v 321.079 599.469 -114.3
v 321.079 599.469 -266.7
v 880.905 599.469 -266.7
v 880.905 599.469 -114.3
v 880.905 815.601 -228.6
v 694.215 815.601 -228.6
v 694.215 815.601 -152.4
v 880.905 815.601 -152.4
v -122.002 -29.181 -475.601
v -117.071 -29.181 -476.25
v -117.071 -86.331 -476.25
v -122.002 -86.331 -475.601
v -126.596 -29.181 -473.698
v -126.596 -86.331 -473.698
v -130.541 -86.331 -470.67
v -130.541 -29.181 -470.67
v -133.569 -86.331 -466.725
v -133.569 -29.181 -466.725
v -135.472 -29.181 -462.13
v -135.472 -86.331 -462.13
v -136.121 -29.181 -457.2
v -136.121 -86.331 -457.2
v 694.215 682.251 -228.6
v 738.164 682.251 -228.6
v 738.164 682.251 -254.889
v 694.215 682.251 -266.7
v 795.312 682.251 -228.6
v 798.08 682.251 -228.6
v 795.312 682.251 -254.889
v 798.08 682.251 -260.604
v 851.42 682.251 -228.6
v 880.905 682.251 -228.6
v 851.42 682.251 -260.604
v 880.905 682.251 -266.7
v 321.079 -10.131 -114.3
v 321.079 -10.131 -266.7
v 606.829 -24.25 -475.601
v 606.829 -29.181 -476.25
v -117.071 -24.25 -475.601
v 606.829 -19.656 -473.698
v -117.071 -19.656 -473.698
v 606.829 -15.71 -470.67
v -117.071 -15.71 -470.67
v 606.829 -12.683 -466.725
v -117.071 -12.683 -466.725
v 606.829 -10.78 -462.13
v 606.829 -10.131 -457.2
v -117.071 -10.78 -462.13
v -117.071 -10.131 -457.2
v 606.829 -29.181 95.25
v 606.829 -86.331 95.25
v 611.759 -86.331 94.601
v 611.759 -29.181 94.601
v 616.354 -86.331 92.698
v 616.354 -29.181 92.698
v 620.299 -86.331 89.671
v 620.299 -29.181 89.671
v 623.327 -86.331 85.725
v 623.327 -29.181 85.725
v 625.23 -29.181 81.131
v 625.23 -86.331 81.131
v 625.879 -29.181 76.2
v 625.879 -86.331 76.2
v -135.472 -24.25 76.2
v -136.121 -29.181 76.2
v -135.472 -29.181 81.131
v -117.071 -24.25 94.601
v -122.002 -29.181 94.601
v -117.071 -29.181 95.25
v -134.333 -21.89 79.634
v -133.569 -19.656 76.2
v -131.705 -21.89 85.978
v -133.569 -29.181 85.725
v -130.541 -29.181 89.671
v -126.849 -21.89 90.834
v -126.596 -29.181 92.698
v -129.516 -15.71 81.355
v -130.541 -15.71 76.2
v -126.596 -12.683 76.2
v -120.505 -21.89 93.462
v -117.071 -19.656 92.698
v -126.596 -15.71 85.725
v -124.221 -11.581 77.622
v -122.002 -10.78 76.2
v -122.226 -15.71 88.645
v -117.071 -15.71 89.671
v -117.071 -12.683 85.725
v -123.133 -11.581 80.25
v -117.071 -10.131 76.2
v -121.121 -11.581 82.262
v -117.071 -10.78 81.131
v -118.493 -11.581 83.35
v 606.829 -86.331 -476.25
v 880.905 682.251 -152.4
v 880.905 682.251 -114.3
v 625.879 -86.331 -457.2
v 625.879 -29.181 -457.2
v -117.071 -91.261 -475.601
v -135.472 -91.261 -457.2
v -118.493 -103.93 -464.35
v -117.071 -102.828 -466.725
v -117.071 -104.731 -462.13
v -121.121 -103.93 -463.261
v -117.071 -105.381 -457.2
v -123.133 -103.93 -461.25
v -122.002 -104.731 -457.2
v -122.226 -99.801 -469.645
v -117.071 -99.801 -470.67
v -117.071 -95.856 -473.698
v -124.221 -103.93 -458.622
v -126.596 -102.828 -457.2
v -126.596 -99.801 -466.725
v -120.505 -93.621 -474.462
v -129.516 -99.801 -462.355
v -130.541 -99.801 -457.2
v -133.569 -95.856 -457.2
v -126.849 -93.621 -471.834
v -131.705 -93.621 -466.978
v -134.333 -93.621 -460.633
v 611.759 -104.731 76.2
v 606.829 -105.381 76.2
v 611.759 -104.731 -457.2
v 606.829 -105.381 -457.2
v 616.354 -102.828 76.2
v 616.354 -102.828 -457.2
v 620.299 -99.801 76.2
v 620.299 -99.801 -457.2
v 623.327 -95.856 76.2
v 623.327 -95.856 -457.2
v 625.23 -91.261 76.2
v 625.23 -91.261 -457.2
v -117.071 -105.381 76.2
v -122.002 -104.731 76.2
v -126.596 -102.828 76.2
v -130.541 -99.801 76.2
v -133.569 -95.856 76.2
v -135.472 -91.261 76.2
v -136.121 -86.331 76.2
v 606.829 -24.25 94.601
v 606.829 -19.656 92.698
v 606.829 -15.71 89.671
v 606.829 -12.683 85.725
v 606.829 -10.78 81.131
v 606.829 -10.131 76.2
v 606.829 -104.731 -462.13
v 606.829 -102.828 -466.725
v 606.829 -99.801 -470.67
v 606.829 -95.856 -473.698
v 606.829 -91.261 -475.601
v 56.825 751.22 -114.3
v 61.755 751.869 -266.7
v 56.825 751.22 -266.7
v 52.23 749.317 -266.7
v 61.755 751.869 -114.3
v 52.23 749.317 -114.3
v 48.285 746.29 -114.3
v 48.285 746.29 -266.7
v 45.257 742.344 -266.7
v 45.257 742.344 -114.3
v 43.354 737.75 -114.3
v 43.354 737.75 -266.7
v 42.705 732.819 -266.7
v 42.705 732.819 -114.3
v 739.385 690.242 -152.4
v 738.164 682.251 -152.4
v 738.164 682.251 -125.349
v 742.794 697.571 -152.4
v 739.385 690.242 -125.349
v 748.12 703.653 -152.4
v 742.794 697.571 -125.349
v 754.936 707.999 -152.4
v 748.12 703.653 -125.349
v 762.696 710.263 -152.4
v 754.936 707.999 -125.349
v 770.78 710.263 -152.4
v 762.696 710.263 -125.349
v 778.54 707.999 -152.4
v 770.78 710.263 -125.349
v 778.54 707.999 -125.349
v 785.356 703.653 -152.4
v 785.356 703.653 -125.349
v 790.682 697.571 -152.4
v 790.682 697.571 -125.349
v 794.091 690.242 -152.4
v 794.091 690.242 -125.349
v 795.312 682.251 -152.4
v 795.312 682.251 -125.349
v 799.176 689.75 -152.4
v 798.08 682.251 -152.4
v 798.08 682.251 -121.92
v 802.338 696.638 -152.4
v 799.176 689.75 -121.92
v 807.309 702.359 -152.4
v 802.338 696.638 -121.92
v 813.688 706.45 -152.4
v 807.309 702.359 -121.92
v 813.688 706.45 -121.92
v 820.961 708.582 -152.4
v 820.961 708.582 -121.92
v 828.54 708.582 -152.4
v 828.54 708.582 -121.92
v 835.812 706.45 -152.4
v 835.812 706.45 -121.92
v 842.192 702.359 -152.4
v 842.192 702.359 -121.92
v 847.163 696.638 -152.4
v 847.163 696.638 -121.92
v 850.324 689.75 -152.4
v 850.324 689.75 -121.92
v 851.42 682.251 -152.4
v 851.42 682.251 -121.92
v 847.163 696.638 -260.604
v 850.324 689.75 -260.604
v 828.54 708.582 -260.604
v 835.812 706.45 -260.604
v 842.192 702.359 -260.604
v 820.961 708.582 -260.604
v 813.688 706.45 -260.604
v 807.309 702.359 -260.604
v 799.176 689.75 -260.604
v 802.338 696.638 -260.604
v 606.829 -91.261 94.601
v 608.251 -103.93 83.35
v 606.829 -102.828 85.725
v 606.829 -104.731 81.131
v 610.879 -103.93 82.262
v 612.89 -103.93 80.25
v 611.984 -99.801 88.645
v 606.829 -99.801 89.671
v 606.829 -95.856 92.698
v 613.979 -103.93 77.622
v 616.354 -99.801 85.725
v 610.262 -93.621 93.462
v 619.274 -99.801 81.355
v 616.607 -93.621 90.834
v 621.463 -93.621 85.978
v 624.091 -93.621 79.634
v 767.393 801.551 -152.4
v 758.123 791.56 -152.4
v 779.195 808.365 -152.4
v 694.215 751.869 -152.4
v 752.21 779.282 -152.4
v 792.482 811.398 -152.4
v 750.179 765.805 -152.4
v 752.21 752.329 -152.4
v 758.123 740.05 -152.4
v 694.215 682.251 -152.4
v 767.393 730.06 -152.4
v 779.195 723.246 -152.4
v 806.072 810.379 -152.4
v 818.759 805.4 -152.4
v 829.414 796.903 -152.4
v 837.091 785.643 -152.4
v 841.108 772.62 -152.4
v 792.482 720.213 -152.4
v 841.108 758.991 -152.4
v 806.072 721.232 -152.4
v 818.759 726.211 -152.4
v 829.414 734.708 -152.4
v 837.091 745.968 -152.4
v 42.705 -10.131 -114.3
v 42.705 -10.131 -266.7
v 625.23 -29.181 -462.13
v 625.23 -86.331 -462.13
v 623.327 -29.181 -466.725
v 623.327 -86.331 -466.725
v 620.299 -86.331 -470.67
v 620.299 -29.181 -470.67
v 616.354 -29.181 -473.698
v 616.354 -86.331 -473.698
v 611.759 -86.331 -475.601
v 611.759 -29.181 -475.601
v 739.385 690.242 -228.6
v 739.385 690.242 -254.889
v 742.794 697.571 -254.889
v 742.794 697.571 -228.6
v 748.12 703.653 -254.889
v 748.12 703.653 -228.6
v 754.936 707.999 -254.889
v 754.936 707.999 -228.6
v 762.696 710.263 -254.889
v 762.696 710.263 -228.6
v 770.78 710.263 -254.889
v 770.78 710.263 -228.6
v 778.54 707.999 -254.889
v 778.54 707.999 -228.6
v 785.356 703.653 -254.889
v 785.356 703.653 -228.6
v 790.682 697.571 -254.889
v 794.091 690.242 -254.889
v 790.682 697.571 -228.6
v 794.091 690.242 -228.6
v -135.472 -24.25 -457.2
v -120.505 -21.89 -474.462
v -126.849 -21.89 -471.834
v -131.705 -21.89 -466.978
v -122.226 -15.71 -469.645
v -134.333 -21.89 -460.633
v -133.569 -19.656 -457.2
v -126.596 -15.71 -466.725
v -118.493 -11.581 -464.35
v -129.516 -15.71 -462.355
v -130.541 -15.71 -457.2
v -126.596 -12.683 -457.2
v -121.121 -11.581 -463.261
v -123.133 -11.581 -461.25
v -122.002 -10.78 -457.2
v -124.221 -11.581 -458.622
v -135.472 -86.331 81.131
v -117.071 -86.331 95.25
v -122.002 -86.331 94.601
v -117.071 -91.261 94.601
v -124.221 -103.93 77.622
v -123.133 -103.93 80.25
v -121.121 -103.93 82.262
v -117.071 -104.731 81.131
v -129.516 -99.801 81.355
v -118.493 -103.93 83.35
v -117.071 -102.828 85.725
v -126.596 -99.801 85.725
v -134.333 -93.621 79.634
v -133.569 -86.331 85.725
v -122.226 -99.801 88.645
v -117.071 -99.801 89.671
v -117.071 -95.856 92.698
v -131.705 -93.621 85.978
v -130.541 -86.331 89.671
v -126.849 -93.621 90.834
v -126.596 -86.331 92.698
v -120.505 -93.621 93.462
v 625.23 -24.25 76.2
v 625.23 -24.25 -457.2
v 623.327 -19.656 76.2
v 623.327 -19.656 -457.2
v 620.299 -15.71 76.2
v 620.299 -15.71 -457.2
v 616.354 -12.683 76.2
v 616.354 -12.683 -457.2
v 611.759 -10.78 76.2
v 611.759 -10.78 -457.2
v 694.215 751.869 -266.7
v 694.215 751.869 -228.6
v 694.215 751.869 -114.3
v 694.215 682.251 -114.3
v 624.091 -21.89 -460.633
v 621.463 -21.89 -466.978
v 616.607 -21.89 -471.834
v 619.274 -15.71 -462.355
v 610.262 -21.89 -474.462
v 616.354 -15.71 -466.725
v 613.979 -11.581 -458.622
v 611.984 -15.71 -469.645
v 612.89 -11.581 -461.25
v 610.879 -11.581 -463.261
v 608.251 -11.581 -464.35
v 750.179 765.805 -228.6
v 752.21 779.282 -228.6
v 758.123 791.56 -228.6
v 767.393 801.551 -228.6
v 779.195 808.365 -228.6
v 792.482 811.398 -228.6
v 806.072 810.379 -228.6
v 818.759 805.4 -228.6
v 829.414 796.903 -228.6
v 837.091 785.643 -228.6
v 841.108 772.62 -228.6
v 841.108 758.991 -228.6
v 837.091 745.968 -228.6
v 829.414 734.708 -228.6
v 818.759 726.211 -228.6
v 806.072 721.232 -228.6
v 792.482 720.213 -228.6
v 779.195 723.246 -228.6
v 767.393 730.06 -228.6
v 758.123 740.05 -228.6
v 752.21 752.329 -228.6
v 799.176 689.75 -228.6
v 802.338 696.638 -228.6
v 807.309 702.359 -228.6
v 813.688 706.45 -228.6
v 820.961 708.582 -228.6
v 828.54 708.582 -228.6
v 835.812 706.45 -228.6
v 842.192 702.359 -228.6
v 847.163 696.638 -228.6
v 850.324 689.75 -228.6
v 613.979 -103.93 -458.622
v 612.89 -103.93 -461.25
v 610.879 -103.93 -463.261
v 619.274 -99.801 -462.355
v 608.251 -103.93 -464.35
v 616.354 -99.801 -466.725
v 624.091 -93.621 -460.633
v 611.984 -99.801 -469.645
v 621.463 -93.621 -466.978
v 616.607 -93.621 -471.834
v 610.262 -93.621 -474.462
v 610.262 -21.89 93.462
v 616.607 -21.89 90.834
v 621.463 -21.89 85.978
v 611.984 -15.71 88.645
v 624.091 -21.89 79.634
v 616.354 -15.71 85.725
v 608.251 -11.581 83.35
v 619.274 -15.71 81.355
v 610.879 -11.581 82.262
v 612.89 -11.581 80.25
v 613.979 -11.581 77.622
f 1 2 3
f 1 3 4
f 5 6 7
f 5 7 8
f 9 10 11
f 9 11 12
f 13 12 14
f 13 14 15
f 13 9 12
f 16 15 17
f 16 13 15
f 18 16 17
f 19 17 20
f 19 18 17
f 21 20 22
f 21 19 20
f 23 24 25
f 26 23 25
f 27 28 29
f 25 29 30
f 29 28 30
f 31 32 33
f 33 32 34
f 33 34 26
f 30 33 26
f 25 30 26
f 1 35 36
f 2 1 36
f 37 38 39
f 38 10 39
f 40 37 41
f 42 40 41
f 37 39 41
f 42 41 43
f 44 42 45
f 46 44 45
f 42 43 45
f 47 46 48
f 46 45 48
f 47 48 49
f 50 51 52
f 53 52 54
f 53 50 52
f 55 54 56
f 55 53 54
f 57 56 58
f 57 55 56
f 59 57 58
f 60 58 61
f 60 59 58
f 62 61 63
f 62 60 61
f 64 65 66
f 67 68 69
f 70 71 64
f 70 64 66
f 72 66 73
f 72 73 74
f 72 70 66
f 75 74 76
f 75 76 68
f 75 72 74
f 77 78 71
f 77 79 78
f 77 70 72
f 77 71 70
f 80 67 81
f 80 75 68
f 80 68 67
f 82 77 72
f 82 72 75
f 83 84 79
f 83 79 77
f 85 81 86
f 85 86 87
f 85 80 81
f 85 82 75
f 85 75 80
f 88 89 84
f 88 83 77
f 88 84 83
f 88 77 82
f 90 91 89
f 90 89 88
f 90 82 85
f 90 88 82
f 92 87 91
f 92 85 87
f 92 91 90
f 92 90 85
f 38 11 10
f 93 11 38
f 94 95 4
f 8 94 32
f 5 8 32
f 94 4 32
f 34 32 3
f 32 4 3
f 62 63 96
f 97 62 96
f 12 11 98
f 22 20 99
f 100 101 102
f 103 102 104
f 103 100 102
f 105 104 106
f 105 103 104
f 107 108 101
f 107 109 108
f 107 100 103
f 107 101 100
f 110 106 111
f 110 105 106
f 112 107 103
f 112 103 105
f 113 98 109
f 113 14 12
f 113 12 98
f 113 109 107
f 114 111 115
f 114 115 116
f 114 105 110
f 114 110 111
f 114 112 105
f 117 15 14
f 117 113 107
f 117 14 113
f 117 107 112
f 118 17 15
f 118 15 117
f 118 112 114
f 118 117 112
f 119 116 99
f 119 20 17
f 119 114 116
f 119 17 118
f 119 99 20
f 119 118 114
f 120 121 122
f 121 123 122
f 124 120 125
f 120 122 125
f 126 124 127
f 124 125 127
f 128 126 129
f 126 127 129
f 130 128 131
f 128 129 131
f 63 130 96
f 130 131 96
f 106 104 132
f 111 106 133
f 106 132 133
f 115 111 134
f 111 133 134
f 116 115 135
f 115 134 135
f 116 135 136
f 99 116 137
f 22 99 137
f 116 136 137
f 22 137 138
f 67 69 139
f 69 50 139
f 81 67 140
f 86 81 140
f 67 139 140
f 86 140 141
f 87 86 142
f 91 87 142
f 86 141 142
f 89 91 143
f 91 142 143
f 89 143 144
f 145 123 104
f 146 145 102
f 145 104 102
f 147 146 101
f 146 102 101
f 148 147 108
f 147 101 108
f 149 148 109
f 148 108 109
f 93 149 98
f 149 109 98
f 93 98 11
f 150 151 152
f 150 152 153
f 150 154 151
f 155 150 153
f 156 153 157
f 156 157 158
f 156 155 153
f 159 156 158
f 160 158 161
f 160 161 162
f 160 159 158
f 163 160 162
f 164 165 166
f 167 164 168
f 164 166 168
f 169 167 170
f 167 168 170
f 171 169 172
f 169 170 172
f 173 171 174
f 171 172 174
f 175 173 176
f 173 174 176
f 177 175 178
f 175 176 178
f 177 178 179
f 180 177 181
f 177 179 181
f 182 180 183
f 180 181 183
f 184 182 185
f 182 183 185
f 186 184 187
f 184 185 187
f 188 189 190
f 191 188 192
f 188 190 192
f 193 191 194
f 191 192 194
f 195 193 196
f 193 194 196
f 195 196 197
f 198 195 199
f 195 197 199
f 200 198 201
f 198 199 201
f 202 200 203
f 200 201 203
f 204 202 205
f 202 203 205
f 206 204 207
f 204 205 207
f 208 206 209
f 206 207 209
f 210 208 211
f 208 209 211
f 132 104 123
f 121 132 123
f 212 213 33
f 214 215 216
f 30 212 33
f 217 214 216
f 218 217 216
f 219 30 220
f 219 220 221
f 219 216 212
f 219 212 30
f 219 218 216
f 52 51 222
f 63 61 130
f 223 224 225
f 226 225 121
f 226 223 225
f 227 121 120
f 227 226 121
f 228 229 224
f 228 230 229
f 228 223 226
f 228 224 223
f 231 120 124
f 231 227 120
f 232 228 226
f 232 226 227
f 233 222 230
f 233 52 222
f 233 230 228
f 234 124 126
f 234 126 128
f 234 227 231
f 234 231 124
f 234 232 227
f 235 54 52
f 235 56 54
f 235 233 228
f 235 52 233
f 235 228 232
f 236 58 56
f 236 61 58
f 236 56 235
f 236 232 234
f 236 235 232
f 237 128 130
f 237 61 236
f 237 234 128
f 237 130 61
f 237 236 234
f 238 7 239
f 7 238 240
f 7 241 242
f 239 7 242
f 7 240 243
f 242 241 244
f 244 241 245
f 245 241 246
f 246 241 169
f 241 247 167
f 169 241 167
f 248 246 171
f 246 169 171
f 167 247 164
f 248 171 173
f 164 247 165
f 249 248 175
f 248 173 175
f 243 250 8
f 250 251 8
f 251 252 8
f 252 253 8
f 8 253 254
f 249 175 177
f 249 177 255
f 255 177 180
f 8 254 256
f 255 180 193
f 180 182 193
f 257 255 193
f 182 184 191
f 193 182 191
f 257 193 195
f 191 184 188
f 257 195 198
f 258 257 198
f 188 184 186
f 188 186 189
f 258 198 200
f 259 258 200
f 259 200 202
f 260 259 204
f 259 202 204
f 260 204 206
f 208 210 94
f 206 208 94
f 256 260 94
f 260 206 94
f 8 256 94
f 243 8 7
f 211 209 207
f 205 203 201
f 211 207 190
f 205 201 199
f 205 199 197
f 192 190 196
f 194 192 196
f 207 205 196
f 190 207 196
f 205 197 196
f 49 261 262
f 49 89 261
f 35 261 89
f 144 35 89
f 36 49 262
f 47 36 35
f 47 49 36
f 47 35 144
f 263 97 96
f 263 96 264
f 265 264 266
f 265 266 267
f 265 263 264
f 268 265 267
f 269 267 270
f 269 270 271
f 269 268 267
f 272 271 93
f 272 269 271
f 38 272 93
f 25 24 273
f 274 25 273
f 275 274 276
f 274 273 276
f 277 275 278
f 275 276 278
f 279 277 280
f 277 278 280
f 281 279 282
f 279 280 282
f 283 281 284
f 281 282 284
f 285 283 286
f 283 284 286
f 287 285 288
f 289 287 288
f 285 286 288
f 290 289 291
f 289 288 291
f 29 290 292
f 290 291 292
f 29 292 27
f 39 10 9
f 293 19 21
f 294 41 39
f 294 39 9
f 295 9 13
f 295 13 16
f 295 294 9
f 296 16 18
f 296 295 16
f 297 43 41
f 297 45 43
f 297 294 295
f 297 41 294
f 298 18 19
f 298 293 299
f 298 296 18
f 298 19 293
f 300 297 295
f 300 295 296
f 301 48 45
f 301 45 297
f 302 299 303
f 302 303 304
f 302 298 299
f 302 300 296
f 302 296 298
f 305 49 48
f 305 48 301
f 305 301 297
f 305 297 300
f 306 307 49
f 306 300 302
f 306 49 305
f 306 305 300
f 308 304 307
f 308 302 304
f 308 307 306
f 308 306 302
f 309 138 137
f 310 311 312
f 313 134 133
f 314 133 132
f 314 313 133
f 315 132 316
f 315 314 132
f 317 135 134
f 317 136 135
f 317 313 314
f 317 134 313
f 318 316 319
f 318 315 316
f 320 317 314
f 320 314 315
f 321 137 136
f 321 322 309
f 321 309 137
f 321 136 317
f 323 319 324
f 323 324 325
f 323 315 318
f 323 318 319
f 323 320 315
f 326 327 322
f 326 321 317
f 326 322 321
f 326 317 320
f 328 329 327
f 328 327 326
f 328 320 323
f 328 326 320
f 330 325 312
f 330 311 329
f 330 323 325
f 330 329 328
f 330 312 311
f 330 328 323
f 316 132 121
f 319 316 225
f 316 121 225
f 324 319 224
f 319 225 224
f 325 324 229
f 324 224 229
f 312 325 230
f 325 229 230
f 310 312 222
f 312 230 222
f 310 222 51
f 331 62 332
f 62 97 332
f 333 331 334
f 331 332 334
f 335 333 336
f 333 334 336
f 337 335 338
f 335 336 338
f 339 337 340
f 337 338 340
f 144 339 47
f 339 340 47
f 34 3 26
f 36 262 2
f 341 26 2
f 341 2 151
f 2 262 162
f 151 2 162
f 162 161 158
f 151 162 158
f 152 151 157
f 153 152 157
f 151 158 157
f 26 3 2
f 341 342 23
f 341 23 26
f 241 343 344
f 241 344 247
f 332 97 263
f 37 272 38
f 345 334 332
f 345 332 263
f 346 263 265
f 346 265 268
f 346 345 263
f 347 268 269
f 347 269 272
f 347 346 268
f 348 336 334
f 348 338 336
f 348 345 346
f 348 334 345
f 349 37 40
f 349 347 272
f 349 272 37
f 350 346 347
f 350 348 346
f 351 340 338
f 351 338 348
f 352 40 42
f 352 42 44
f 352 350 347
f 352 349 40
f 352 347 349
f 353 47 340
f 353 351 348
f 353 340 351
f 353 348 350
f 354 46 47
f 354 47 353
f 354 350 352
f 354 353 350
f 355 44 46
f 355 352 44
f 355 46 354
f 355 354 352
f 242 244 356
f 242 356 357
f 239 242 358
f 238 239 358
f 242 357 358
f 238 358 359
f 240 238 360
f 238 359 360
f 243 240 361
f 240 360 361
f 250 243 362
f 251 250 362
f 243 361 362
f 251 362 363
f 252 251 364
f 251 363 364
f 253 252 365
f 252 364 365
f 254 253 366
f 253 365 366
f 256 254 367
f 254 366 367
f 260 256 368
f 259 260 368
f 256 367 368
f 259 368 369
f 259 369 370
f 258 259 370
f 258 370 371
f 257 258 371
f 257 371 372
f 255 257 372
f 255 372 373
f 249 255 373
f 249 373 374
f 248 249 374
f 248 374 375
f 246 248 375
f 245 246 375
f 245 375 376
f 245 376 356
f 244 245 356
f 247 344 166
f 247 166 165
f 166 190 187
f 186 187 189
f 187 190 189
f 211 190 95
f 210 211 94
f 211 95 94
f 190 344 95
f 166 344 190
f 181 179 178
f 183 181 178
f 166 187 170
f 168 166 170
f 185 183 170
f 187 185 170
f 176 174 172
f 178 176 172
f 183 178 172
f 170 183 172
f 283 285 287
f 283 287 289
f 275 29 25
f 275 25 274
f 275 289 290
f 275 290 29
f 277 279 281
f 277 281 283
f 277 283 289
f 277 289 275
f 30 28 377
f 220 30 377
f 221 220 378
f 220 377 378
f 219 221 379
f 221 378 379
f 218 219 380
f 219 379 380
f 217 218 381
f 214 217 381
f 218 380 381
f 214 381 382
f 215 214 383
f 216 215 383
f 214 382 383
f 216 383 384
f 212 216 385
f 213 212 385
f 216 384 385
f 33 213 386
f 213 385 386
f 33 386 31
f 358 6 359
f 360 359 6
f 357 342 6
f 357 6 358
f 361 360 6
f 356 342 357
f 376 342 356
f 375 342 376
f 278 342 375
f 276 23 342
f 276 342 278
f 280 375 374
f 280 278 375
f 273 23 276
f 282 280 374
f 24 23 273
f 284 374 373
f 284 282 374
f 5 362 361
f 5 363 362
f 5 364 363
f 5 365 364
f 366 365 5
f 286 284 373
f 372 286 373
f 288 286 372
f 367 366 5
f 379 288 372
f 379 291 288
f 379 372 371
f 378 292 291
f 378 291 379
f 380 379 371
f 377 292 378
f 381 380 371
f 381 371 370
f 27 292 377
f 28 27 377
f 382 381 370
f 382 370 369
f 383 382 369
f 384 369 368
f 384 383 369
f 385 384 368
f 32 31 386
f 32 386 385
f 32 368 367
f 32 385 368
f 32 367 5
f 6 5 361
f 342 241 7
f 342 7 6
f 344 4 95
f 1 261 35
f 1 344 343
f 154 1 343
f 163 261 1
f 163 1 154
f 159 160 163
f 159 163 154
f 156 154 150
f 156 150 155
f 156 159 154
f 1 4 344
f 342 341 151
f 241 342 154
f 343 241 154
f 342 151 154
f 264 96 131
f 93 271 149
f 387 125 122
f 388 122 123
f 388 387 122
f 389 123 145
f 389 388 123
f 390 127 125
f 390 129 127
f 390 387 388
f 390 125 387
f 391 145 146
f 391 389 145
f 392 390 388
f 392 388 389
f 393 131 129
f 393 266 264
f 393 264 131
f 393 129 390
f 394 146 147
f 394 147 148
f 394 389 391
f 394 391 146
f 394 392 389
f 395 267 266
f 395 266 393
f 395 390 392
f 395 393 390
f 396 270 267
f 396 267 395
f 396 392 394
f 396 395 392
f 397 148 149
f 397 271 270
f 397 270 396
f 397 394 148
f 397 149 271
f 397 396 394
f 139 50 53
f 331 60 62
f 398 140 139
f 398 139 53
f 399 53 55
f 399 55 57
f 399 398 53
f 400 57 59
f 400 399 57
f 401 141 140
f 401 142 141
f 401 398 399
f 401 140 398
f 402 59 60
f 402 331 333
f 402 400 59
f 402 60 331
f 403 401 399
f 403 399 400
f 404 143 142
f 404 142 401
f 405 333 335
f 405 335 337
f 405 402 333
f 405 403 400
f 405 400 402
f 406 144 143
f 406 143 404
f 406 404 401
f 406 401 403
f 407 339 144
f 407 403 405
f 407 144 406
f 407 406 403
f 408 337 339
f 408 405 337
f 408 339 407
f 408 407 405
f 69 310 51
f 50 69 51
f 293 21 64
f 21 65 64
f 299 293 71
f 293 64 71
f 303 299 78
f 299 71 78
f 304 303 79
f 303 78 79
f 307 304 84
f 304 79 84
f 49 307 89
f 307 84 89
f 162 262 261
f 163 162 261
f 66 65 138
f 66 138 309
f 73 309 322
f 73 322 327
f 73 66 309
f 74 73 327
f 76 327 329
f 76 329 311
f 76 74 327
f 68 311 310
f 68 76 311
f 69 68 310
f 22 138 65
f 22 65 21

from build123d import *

# Parameters (mm, degrees)
SKETCH1_W                 = 508
SKETCH1_H                 = 381
BOSS_EXTRUDE1_DEPTH       = 63.5
FILLET4_R                 = 12.7
FILLET5_R                 = 12.7
FILLET6_R                 = 12.7
FILLET7_R                 = 12.7
FILLET8_R                 = 12.7
FILLET9_R                 = 12.7
SKETCH2_W                 = 185.582579438
SKETCH2_H                 = 101.6
BOSS_EXTRUDE2_DEPTH       = 406.4
SKETCH26_W                = 101.6
SKETCH26_H                = 101.6
BOSS_EXTRUDE16_DEPTH      = 558.8
SKETCH28_W                = 101.849960699
SKETCH28_H                = 50.8
CUT_EXTRUDE8_DEPTH        = 127
SKETCH29_W                = 124.46
SKETCH29_H                = 50.8
BOSS_EXTRUDE18_DEPTH      = 88.9
FILLET10_R                = 12.7
BOSS_EXTRUDE21_DEPTH      = 18.796
BOSS_EXTRUDE21_DEPTH_BACK = 73.66
SKETCH31_R                = 17.78
BOSS_EXTRUDE22_DEPTH      = 14.986
BOSS_EXTRUDE22_DEPTH_BACK = 71.374
SKETCH32_R                = 19.05
SKETCH33_R                = 30.48
CUT_EXTRUDE10_DEPTH       = 71.374
SCALE1_SCALE              = 1.5


with BuildPart() as part:
    # Sketch1 → Boss-Extrude1 (new body)
    with BuildSketch(Plane(origin=(0, 0, 0), x_dir=(1, 0, 0), z_dir=(0, 1, 0))):
        with Locations((254, 190.5)):
            Rectangle(SKETCH1_W, SKETCH1_H)
    extrude(amount=BOSS_EXTRUDE1_DEPTH)

    # Fillet4
    fillet4_edges = [part.edges().sort_by_distance(p)[0] for p in [
        (508, 31.75, 0),
    ]]
    fillet(fillet4_edges, radius=FILLET4_R)

    # Fillet5
    fillet5_edges = [part.edges().sort_by_distance(p)[0] for p in [
        (508, 31.75, -381),
    ]]
    fillet(fillet5_edges, radius=FILLET5_R)

    # Fillet6
    fillet6_edges = [part.edges().sort_by_distance(p)[0] for p in [
        (0, 31.75, -381),
    ]]
    fillet(fillet6_edges, radius=FILLET6_R)

    # Fillet7
    fillet7_edges = [part.edges().sort_by_distance(p)[0] for p in [
        (0, 31.75, 0),
    ]]
    fillet(fillet7_edges, radius=FILLET7_R)

    # Fillet8
    fillet8_edges = [part.edges().sort_by_distance(p)[0] for p in [
        (508, 0, -190.5),
        (504.280256121, 0, -3.719743879),
        (254, 0, -381),
        (504.280256121, 0, -377.280256121),
        (0, 0, -190.5),
        (3.719743879, 0, -377.280256121),
        (254, 0, 0),
        (3.719743879, 0, -3.719743879),
    ]]
    fillet(fillet8_edges, radius=FILLET8_R)

    # Fillet9
    fillet9_edges = [part.edges().sort_by_distance(p)[0] for p in [
        (508, 63.5, -190.5),
        (504.280256121, 63.5, -3.719743879),
        (254, 63.5, -381),
        (504.280256121, 63.5, -377.280256121),
        (0, 63.5, -190.5),
        (3.719743879, 63.5, -377.280256121),
        (254, 63.5, 0),
        (3.719743879, 63.5, -3.719743879),
    ]]
    fillet(fillet9_edges, radius=FILLET9_R)

    # Sketch2 → Boss-Extrude2 (add)
    with BuildSketch(Plane(origin=(0, 63.5, 0), x_dir=(1, 0, 0), z_dir=(0, 1, 0))):
        with Locations((212.008710281, 190.5)):
            Rectangle(SKETCH2_W, SKETCH2_H)
    extrude(amount=BOSS_EXTRUDE2_DEPTH)

    # Sketch26 → Boss-Extrude16 (add)
    with BuildSketch(Plane.ZY.offset(-119.217420562)):
        with Locations((-190.5, 520.7)):
            Rectangle(SKETCH26_W, SKETCH26_H)
    extrude(amount=-BOSS_EXTRUDE16_DEPTH)

    # Sketch28 → Cut-Extrude8 (cut)
    with BuildSketch(Plane(origin=(680.557420562, 0, 0), x_dir=(0, 0, -1), z_dir=(1, 0, 0))):
        with Locations((190.588941682, 550.48771611)):
            Rectangle(SKETCH28_W, SKETCH28_H)
    extrude(amount=-CUT_EXTRUDE8_DEPTH, mode=Mode.SUBTRACT)

    # Sketch29 → Boss-Extrude18 (add)
    with BuildSketch(Plane(origin=(0, 525.08771611, 0), x_dir=(1, 0, 0), z_dir=(0, 1, 0))):
        with Locations((615.787420562, 190.5)):
            Rectangle(SKETCH29_W, SKETCH29_H)
    extrude(amount=BOSS_EXTRUDE18_DEPTH)

    # Fillet10
    fillet10_edges = [part.edges().sort_by_distance(p)[0] for p in [
        (119.217420562, 571.5, -190.5),
    ]]
    fillet(fillet10_edges, radius=FILLET10_R)

    # Sketch31 → Boss-Extrude21 (add, two sides: drawn at the far end of the back side and taken through both)
    with BuildSketch(Plane(origin=(0, 0, -218.44), x_dir=(-1, 0, 0), z_dir=(0, 0, -1)).offset(-BOSS_EXTRUDE21_DEPTH_BACK)):
        with Locations((-640.580859251, 525.041927268)):
            Circle(SKETCH31_R)
    extrude(amount=BOSS_EXTRUDE21_DEPTH + BOSS_EXTRUDE21_DEPTH_BACK)

    # Sketch32 → Boss-Extrude22 (add, two sides: drawn at the far end of the back side and taken through both)
    with BuildSketch(Plane(origin=(0, 0, -218.44), x_dir=(-1, 0, 0), z_dir=(0, 0, -1)).offset(-BOSS_EXTRUDE22_DEPTH_BACK)):
        with Locations((-601.906085303, 524.903929641)):
            Circle(SKETCH32_R)
    extrude(amount=BOSS_EXTRUDE22_DEPTH + BOSS_EXTRUDE22_DEPTH_BACK)

    # Sketch33 → Cut-Extrude10 (cut)
    with BuildSketch(Plane(origin=(0, 0, -218.44), x_dir=(-1, 0, 0), z_dir=(0, 0, -1))):
        with Locations((-621.346482392, 580.790680071)):
            Circle(SKETCH33_R)
    extrude(amount=-CUT_EXTRUDE10_DEPTH, mode=Mode.SUBTRACT)


with BuildPart() as part_1:
    # Scale1: scaled about (272.242227358, 210.761068124, -190.500428021)
    add(part.part.scale(SCALE1_SCALE).moved(Location((-136.121113679, -105.380534062, 95.250214011))))


solid = part_1.part
